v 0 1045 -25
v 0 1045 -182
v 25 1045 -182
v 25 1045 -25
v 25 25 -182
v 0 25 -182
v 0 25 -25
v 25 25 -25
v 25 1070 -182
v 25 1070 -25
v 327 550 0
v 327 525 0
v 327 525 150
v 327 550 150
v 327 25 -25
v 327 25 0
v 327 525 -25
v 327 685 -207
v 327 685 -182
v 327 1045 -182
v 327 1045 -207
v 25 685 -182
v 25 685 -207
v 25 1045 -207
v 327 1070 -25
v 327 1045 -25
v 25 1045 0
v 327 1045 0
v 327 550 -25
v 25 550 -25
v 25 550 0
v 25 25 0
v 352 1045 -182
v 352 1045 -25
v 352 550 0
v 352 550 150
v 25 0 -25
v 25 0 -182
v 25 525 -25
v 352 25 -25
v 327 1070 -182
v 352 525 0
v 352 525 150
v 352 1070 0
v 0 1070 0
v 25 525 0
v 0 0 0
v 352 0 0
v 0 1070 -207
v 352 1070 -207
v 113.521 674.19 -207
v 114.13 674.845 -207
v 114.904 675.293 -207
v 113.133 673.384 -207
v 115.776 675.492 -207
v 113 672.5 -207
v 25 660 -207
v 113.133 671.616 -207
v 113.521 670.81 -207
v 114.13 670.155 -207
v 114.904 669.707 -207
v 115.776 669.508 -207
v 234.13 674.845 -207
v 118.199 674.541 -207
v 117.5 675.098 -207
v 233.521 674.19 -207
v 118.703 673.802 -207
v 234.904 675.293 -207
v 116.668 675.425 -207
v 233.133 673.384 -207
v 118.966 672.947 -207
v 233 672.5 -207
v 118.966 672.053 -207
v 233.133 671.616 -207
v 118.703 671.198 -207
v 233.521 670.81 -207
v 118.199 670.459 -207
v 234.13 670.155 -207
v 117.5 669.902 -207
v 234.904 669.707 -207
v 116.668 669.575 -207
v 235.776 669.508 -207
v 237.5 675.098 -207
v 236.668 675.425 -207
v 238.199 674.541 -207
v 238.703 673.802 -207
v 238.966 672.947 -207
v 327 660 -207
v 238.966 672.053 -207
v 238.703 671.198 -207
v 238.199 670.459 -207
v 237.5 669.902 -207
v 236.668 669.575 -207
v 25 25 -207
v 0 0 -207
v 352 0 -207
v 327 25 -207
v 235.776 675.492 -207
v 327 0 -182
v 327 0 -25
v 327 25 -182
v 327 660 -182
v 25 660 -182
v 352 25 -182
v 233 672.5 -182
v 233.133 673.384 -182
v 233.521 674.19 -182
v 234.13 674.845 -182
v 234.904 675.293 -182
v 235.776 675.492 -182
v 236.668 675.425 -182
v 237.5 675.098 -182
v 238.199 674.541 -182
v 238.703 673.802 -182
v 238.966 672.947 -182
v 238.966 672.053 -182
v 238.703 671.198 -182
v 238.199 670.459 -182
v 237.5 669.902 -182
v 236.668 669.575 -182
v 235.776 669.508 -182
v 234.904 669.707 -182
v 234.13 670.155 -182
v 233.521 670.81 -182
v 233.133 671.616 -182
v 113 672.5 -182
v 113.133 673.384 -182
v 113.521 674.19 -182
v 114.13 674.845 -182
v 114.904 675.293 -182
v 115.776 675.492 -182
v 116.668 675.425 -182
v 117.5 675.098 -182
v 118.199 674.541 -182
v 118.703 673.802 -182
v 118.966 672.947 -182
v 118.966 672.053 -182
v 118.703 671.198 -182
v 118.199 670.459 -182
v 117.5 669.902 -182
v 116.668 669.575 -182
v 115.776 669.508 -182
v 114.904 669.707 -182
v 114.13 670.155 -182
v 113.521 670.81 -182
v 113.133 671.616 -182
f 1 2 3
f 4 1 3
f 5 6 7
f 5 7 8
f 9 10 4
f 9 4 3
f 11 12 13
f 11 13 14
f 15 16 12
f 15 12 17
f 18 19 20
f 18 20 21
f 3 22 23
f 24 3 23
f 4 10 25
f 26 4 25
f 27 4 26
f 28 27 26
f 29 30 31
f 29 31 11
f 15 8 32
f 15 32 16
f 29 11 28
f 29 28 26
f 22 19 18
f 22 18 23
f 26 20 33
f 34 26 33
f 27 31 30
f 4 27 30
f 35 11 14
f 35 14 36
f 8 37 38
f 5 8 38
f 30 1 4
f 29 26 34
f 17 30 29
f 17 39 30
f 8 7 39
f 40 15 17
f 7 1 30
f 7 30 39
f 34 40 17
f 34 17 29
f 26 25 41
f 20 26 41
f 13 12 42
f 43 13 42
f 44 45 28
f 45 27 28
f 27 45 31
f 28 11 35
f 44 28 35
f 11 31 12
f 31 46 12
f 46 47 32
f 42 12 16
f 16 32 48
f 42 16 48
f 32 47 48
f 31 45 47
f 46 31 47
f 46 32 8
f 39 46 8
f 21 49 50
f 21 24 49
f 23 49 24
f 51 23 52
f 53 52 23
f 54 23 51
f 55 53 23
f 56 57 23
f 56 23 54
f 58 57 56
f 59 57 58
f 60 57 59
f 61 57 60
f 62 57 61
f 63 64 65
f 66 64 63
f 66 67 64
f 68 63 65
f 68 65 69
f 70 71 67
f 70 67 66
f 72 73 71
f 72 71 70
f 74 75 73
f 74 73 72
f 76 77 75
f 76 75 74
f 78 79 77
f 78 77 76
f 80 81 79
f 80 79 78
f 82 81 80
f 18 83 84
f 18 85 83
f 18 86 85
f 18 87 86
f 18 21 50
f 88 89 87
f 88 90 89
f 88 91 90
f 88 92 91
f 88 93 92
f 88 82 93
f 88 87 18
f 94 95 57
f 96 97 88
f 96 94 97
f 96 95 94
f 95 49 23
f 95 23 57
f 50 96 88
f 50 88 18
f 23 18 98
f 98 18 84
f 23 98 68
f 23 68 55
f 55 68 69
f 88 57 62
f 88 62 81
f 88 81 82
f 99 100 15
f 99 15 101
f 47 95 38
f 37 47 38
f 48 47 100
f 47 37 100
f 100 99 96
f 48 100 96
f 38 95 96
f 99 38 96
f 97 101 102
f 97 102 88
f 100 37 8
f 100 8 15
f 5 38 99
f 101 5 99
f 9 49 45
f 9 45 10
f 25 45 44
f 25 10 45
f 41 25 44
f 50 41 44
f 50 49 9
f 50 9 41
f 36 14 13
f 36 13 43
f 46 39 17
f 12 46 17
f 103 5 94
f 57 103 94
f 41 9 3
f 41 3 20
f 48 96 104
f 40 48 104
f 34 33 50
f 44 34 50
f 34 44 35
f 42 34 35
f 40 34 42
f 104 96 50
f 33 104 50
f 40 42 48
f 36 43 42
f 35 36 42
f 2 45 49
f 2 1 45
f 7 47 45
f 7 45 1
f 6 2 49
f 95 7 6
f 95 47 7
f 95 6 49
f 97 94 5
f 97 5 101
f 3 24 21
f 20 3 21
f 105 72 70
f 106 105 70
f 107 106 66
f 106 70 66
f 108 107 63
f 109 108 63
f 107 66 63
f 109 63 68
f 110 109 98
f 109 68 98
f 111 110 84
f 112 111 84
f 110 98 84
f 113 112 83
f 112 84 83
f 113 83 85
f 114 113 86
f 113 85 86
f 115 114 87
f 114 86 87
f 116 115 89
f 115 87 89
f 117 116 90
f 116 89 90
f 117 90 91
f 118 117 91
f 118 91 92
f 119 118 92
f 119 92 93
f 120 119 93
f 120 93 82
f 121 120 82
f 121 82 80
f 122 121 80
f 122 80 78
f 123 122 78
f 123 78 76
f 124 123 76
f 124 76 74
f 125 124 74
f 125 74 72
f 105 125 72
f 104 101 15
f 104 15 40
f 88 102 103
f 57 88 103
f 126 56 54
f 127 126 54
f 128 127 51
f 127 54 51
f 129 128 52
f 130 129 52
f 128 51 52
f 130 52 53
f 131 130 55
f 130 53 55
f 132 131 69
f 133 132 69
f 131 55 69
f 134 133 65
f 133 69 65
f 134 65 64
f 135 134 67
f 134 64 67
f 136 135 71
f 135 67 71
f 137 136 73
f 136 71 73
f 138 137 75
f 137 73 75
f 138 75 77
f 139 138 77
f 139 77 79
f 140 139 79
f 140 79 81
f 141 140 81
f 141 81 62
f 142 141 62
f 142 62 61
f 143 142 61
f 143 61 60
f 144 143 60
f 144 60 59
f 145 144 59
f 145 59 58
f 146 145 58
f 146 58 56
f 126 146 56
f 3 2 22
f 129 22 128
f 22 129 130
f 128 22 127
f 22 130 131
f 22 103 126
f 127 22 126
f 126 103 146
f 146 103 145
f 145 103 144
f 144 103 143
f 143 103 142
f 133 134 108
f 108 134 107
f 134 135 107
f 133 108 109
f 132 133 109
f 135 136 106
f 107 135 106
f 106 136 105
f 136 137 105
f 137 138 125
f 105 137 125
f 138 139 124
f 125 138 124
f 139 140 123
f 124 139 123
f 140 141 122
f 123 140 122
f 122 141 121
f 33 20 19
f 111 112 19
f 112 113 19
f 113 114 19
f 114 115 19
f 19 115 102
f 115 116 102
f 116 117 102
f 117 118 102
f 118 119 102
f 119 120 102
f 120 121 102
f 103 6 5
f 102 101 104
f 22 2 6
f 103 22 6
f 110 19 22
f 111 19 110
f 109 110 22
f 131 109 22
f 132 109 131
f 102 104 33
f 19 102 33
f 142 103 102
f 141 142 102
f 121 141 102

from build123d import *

# Parameters (mm, degrees)
SKETCH_1_W          = 352
SKETCH_1_H          = 207
SKETCH_1_W_2        = 302
SKETCH_1_H_2        = 157
EXTRUDE_1_DEPTH     = 25
SKETCH_2_W          = 25
SKETCH_2_H          = 25
EXTRUDE_2_DEPTH     = 1045
SKETCH_3_W          = 352
SKETCH_3_H          = 207
SKETCH_3_W_2        = 302
SKETCH_3_H_2        = 157
EXTRUDE_3_DEPTH     = 25
EXTRUDE_START       = -25
SKETCH_4_W          = 302
SKETCH_4_H          = 25
EXTRUDE_4_DEPTH     = 25
SKETCH_5_W          = 302
SKETCH_5_H          = 25
EXTRUDE_5_DEPTH     = 25
SKETCH_6_W          = 25
SKETCH_6_H          = 25
EXTRUDE_6_DEPTH     = 150
CUT_EXTRUDE_1_REACH = 359
SKETCH_7_R          = 3


with BuildPart() as part:
    # Эскиз1 → Бобышка-Вытянуть1 (new body)
    with BuildSketch(Plane(origin=(0, 0, 0), x_dir=(1, 0, 0), z_dir=(0, 1, 0))):
        with Locations((176, 103.5)):
            Rectangle(SKETCH_1_W, SKETCH_1_H)
        with Locations((176, 103.5)):
            Rectangle(SKETCH_1_W_2, SKETCH_1_H_2, mode=Mode.SUBTRACT)
    extrude(amount=EXTRUDE_1_DEPTH)

    # Эскиз2 → Бобышка-Вытянуть2 (add)
    with BuildSketch(Plane(origin=(0, 25, 0), x_dir=(1, 0, 0), z_dir=(0, 1, 0))):
        with Locations((12.5, 194.5)):
            Rectangle(SKETCH_2_W, SKETCH_2_H)
        with Locations((12.5, 12.5)):
            Rectangle(SKETCH_2_W, SKETCH_2_H)
        with Locations((339.5, 12.5)):
            Rectangle(SKETCH_2_W, SKETCH_2_H)
        with Locations((339.5, 194.5)):
            Rectangle(SKETCH_2_W, SKETCH_2_H)
    extrude(amount=EXTRUDE_2_DEPTH)

    # Эскиз3 → Бобышка-Вытянуть3 (add)
    with BuildSketch(Plane(origin=(0, 1070, 0), x_dir=(1, 0, 0), z_dir=(0, 1, 0))):
        with Locations((176, 103.5)):
            Rectangle(SKETCH_3_W, SKETCH_3_H)
        with Locations((176, 103.5)):
            Rectangle(SKETCH_3_W_2, SKETCH_3_H_2, mode=Mode.SUBTRACT)
    extrude(amount=-EXTRUDE_3_DEPTH)

    # Эскиз4 → Бобышка-Вытянуть4 (add)
    with BuildSketch(Plane(origin=(0, 0, -207), x_dir=(-1, 0, 0), z_dir=(0, 0, -1)).offset(EXTRUDE_START)):
        with Locations((-176, 672.5)):
            Rectangle(SKETCH_4_W, SKETCH_4_H)
    extrude(amount=EXTRUDE_4_DEPTH)

    # Эскиз5 → Бобышка-Вытянуть5 (add)
    with BuildSketch(Plane.XY.offset(EXTRUDE_START)):
        with Locations((176, 537.5)):
            Rectangle(SKETCH_5_W, SKETCH_5_H)
    extrude(amount=EXTRUDE_5_DEPTH)

    # Эскиз6 → Бобышка-Вытянуть6 (add)
    with BuildSketch(Plane.XY):
        with Locations((339.5, 537.5)):
            Rectangle(SKETCH_6_W, SKETCH_6_H)
    extrude(amount=EXTRUDE_6_DEPTH)

    # Эскиз7 → Вырез-Вытянуть1 (cut, up to next)
    with BuildSketch(Plane(origin=(0, 0, -207), x_dir=(-1, 0, 0), z_dir=(0, 0, -1)), mode=Mode.PRIVATE) as cut_extrude_1_sk1:
        with Locations((-236, 672.5)):
            Circle(SKETCH_7_R)
    cut_extrude_1_tool1 = extrude(cut_extrude_1_sk1.sketch, amount=-CUT_EXTRUDE_1_REACH, mode=Mode.PRIVATE) & part.part
    add(cut_extrude_1_tool1.solids().sort_by_distance((236, 672.5, -207))[0], mode=Mode.SUBTRACT)
    # Эскиз7 → Вырез-Вытянуть1 (cut, up to next)
    with BuildSketch(Plane(origin=(0, 0, -207), x_dir=(-1, 0, 0), z_dir=(0, 0, -1)), mode=Mode.PRIVATE) as cut_extrude_1_sk2:
        with Locations((-116, 672.5)):
            Circle(SKETCH_7_R)
    cut_extrude_1_tool2 = extrude(cut_extrude_1_sk2.sketch, amount=-CUT_EXTRUDE_1_REACH, mode=Mode.PRIVATE) & part.part
    add(cut_extrude_1_tool2.solids().sort_by_distance((116, 672.5, -207))[0], mode=Mode.SUBTRACT)


solid = part.part
